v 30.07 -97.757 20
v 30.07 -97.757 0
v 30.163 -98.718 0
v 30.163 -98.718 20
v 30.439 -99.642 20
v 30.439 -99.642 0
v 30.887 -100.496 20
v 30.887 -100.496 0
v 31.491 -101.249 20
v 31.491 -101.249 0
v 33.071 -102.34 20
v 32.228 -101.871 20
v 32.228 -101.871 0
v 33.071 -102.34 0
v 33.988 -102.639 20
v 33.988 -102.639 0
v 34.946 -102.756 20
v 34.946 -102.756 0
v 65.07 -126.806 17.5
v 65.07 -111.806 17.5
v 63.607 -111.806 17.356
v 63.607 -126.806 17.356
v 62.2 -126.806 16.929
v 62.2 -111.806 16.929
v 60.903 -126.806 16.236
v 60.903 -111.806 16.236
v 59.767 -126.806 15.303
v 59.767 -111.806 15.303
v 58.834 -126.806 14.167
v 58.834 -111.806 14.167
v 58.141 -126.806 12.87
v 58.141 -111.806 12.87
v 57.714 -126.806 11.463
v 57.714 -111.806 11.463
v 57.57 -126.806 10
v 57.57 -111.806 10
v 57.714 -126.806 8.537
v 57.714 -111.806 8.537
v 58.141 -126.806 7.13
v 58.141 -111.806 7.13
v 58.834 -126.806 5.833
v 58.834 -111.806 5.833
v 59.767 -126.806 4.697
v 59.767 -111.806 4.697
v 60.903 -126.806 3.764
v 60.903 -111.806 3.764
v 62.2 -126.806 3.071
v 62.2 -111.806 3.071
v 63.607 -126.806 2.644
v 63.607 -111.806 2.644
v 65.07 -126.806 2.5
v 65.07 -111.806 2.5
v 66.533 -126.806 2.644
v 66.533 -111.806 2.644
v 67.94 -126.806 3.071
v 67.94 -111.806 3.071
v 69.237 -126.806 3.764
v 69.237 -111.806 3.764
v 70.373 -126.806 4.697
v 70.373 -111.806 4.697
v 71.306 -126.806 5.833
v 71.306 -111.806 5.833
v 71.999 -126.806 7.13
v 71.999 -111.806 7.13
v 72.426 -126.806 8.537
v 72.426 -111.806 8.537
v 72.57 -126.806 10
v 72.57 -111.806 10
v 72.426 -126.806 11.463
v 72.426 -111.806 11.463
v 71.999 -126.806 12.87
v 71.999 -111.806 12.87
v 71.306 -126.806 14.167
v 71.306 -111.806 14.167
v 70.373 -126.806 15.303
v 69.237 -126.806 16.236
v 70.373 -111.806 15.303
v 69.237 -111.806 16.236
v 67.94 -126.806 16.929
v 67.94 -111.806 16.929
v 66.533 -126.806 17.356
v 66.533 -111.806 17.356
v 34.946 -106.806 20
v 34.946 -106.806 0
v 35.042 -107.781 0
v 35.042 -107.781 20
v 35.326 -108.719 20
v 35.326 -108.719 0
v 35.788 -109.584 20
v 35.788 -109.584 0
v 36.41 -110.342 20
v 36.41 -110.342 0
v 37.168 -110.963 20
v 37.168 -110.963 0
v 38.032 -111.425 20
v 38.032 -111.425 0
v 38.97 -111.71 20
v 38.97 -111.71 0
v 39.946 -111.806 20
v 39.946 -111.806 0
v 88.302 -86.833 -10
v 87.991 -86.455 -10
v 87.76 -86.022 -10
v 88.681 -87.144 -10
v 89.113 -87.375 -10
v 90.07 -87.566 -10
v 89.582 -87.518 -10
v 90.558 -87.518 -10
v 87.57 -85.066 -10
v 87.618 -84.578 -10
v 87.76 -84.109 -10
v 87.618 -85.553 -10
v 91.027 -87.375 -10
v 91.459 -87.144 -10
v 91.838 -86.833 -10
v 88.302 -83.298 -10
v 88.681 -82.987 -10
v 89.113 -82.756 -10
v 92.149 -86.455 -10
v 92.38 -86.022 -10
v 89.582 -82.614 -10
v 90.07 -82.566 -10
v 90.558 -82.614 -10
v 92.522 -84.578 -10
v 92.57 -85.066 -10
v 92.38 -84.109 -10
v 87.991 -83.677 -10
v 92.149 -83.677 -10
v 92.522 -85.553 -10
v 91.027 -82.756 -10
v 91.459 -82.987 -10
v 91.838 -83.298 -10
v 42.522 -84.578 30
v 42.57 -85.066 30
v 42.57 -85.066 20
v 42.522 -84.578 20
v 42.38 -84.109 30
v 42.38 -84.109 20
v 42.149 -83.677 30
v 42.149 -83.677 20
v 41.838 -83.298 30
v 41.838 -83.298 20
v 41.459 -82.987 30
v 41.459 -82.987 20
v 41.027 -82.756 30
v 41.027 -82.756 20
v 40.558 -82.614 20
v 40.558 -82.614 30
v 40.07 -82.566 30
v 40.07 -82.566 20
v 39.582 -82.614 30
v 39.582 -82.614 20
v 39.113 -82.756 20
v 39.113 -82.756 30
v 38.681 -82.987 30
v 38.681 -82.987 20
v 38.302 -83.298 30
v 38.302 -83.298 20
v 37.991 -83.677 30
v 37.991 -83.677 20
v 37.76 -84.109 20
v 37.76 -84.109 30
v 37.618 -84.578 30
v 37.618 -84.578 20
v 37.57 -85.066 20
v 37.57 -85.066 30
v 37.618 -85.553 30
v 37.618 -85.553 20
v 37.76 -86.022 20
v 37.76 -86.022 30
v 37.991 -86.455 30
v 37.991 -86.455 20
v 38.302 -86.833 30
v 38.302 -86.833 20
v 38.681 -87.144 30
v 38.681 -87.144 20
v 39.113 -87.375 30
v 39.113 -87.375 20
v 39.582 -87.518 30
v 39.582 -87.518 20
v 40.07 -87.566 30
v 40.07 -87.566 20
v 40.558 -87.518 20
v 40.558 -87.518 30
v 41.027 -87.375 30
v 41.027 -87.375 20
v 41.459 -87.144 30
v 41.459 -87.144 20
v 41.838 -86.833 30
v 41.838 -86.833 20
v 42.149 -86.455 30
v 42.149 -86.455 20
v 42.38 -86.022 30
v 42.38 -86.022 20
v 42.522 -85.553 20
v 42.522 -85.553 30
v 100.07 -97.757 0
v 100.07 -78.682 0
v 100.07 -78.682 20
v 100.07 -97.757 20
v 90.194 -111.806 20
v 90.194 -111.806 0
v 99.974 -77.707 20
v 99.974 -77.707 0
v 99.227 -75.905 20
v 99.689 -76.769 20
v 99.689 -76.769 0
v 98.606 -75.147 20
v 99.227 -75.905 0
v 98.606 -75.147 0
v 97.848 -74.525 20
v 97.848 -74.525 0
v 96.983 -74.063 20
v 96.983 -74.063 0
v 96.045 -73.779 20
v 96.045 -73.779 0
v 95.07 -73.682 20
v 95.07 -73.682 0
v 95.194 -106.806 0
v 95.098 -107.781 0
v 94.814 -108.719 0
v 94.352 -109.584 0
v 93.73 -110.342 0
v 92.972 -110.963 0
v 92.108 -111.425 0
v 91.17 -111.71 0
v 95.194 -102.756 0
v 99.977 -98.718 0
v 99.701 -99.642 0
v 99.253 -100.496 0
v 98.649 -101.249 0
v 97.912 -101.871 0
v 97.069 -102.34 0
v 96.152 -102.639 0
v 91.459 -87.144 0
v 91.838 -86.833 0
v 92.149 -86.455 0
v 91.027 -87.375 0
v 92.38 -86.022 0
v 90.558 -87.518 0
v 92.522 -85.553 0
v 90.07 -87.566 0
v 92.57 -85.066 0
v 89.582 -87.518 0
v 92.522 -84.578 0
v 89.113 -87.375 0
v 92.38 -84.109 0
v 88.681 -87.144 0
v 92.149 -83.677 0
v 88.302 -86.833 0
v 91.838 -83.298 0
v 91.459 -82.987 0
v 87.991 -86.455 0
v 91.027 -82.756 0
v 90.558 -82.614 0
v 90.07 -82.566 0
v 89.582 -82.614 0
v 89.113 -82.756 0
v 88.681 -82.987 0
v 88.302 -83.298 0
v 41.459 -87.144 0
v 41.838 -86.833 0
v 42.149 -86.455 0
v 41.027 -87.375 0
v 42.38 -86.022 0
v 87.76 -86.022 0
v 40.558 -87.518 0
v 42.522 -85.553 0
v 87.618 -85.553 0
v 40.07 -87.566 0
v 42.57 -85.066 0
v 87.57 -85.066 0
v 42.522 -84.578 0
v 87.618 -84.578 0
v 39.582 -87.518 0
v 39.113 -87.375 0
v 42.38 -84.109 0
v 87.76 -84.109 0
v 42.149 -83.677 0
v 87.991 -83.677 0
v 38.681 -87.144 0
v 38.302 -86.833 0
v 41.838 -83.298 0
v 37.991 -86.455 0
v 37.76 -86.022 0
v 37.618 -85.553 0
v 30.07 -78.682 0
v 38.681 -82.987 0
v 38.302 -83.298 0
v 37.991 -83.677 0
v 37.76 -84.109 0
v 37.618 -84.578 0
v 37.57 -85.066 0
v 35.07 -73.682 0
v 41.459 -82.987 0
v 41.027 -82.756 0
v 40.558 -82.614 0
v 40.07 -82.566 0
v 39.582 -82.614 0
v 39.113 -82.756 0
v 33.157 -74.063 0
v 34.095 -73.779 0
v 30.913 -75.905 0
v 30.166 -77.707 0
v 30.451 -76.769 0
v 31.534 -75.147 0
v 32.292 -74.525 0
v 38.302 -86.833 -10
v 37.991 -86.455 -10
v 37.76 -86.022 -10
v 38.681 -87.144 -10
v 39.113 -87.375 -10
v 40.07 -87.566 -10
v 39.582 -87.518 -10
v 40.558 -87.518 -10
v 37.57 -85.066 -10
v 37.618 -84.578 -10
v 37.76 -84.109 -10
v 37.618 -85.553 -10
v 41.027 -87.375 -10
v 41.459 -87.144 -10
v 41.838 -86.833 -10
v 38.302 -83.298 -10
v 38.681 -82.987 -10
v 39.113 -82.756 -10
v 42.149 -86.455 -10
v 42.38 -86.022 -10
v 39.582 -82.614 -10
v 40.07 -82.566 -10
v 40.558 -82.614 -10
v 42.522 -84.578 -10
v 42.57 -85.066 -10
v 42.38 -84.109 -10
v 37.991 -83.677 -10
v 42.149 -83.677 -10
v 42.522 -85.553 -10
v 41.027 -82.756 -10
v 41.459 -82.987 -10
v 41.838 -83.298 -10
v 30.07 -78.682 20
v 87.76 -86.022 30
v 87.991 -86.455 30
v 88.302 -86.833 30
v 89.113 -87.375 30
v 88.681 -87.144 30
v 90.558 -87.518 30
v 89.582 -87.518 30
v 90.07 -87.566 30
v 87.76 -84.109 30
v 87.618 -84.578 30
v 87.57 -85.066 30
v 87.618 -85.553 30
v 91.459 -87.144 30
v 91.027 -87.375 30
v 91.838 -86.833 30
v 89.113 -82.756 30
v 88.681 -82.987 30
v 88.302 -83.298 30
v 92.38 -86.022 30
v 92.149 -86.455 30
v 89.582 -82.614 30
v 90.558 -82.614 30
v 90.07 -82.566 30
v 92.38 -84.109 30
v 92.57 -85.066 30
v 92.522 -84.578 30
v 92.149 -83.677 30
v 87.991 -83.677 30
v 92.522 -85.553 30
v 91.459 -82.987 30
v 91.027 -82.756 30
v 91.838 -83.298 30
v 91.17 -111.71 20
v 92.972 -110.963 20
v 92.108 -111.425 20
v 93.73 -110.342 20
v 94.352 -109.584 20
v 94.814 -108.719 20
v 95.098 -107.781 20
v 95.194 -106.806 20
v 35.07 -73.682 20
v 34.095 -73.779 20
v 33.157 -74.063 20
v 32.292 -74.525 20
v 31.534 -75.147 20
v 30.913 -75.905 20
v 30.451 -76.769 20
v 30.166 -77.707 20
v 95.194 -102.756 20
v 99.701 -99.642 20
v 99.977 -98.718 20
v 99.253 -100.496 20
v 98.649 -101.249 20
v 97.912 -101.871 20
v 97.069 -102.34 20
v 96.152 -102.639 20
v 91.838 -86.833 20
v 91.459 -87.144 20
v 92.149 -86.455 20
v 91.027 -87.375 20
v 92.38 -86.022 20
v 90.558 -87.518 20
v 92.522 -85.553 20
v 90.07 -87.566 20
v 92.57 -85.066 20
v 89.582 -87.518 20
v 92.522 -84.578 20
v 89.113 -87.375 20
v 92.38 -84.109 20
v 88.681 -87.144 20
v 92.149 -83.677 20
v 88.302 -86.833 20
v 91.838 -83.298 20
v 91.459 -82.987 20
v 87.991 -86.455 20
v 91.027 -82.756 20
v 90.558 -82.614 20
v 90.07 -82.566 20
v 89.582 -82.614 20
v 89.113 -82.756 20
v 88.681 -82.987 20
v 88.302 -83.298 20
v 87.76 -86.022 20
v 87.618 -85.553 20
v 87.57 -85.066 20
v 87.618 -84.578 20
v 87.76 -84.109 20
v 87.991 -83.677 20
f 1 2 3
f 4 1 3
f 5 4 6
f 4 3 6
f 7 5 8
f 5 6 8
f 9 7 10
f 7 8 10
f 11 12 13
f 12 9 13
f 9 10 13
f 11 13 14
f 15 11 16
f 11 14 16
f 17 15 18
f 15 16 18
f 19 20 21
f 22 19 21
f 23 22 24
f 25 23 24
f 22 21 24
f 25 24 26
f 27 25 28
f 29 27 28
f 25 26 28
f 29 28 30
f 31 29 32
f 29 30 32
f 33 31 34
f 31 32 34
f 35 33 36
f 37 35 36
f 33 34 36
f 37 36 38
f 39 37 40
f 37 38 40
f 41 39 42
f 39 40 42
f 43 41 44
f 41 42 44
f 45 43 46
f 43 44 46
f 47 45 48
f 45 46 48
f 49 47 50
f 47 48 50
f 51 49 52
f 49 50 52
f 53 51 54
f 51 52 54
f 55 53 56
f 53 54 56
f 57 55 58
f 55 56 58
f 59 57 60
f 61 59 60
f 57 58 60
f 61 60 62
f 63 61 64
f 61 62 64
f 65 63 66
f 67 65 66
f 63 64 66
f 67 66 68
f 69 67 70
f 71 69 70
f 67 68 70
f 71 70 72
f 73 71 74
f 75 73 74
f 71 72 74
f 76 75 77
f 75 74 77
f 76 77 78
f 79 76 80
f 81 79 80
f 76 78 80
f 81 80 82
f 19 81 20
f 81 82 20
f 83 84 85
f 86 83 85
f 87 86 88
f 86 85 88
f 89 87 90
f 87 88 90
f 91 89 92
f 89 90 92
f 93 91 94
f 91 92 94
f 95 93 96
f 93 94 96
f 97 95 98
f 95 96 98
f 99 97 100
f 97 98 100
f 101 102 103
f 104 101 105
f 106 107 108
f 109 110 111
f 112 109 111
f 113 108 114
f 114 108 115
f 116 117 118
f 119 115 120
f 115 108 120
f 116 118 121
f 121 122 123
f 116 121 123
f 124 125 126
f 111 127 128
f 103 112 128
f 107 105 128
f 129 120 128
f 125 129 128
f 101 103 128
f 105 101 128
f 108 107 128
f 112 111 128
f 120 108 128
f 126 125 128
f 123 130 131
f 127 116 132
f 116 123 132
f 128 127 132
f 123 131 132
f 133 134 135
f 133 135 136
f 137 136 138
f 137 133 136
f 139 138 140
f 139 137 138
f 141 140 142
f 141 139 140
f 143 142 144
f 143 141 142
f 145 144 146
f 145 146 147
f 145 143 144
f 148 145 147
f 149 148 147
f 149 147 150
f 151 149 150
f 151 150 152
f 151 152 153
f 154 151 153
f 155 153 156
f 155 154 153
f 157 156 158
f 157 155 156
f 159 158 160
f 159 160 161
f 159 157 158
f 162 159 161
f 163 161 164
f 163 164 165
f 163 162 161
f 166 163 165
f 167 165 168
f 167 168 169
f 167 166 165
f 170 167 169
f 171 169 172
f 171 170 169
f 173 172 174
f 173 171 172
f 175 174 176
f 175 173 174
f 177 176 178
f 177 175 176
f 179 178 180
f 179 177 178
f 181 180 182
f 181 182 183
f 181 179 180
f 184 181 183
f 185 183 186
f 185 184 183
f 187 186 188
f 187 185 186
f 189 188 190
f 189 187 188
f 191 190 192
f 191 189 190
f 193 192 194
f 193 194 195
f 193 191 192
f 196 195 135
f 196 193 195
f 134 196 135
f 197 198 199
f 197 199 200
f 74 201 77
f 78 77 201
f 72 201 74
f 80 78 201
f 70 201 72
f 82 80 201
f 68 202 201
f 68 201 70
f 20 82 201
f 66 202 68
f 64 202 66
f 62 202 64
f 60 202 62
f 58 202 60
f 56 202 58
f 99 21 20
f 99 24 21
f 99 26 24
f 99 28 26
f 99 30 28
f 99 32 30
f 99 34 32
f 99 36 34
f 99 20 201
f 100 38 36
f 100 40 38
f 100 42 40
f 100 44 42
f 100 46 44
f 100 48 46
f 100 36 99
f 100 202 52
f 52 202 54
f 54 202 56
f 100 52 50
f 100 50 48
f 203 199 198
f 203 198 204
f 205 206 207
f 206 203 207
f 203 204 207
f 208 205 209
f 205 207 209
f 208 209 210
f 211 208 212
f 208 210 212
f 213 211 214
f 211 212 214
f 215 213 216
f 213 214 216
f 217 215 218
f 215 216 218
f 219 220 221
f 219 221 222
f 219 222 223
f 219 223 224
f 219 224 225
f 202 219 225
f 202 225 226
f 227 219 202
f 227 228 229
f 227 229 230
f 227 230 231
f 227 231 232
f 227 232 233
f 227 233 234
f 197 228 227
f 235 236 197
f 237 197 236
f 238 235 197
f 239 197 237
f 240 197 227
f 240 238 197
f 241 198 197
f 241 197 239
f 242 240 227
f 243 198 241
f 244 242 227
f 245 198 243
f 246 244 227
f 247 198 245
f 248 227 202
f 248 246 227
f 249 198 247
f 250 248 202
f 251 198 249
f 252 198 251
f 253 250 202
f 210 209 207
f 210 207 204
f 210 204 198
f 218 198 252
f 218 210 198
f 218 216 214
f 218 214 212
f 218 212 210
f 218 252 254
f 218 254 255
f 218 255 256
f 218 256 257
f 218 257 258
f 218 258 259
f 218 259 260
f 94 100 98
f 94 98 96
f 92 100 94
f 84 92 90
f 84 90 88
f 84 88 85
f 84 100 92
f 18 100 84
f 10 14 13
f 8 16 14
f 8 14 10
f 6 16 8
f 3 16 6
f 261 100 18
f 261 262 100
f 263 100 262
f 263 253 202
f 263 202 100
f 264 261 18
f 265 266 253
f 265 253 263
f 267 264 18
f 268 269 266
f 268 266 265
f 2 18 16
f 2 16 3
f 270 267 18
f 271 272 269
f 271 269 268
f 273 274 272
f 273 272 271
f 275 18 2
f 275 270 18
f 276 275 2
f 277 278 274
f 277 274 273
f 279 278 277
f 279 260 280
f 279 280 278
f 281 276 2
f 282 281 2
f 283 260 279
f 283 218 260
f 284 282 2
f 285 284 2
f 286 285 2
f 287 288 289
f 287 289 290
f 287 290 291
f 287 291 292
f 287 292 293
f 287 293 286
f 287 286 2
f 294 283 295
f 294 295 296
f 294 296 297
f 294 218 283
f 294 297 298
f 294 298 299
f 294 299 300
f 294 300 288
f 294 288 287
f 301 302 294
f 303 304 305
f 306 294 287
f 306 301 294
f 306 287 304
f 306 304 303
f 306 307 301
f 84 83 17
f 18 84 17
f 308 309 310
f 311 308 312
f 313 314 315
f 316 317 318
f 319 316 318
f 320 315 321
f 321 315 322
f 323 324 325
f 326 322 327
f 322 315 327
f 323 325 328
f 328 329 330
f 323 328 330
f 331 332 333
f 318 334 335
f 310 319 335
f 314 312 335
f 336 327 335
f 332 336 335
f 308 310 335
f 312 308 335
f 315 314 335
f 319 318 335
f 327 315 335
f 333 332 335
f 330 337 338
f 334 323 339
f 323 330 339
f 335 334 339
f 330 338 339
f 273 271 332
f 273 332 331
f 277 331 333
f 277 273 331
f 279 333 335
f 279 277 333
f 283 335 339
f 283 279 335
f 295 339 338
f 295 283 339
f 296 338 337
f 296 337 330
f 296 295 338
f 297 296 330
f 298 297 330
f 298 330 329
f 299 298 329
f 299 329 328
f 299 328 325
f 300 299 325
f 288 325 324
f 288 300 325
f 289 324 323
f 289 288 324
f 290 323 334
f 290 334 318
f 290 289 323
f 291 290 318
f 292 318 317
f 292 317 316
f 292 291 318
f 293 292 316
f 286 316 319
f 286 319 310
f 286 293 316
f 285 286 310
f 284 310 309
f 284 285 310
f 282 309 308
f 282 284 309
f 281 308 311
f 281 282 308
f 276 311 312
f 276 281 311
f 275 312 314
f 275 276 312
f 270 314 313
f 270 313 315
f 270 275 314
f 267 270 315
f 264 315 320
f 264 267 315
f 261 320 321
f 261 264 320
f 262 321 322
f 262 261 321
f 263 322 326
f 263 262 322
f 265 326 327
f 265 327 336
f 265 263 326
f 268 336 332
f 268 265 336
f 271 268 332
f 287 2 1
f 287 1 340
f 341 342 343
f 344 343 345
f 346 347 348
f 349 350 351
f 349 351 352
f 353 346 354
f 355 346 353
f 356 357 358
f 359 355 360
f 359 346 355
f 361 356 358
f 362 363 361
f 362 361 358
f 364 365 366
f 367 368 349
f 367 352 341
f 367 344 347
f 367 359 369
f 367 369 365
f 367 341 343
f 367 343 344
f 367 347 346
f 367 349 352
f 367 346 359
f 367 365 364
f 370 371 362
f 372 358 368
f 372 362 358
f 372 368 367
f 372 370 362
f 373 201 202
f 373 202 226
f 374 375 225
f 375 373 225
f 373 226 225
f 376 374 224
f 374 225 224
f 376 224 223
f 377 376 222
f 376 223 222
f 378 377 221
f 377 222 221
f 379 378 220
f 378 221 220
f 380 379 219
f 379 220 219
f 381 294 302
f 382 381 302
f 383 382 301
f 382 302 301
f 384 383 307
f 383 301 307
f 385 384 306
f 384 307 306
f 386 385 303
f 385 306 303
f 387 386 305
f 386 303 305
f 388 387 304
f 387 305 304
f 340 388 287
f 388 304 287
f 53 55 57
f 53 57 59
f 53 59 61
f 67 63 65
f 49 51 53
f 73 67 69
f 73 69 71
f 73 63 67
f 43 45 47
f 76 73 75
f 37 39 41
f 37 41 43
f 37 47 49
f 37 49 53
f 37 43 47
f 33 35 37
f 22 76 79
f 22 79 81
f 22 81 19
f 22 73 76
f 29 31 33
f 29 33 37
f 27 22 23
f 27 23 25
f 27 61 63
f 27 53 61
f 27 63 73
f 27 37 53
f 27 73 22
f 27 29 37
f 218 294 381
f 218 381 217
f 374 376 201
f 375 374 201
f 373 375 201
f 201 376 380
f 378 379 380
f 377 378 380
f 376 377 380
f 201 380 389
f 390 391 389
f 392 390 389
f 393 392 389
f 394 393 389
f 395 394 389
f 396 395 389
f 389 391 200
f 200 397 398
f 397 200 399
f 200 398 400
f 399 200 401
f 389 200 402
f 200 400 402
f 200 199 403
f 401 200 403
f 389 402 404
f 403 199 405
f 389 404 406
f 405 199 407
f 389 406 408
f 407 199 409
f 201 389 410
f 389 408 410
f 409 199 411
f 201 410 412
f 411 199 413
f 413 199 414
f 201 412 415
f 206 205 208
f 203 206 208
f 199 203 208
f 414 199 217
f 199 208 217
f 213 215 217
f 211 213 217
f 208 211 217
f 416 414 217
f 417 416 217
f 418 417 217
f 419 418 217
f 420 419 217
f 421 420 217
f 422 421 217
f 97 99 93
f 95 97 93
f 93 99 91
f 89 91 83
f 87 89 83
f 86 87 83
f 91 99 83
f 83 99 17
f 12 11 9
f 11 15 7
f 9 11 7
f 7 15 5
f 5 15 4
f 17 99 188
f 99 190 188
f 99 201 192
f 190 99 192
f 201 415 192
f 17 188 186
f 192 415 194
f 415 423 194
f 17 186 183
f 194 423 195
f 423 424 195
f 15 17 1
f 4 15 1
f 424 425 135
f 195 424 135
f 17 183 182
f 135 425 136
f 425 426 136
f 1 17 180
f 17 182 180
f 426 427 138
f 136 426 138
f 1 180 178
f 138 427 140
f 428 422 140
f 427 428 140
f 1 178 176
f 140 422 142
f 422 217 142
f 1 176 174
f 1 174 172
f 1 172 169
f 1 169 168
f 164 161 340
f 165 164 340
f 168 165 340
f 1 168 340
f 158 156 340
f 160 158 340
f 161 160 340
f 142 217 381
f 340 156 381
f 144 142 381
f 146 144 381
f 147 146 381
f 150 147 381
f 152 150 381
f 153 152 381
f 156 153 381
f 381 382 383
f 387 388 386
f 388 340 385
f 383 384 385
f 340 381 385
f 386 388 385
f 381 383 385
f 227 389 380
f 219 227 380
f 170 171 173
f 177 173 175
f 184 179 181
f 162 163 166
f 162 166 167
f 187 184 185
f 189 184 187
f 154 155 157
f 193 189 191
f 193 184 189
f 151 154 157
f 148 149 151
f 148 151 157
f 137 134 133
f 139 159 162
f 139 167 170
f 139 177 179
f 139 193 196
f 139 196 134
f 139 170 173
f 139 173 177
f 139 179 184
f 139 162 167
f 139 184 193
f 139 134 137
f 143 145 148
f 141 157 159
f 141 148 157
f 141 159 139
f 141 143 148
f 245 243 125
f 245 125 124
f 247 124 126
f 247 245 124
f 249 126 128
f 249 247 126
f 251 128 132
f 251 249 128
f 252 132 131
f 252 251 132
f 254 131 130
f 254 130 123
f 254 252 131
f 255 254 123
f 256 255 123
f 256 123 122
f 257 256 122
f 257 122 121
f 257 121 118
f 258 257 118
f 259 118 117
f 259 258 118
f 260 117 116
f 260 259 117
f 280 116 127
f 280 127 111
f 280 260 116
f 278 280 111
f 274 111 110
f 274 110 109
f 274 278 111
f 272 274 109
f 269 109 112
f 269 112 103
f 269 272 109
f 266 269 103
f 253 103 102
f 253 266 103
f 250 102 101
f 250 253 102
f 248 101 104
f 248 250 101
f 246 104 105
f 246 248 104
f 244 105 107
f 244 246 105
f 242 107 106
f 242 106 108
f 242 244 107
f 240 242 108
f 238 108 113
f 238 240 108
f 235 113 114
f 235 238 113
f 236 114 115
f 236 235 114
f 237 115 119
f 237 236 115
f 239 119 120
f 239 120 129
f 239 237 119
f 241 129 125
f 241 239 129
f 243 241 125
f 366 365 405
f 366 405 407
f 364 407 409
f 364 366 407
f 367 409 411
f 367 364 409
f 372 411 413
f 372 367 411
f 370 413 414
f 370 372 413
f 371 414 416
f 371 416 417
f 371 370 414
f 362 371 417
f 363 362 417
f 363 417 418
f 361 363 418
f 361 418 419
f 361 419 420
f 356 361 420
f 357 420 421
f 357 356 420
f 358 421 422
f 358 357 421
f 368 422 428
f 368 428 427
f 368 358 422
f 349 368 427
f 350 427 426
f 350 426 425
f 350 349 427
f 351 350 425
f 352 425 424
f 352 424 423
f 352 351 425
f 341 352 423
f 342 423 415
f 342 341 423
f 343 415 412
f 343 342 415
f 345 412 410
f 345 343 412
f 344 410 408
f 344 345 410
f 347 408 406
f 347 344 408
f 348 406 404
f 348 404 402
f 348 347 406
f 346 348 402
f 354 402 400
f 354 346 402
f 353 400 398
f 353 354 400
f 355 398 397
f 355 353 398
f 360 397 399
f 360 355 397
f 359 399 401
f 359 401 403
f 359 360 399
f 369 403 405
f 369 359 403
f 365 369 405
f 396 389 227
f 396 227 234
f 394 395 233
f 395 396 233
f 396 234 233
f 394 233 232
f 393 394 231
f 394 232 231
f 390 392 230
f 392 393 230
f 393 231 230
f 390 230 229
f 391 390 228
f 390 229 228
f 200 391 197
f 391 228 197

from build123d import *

# Parameters (mm, degrees)
SKETCH1_R             = 2.5
BOSS_EXTRUDE1_DEPTH   = 10
BOSS_EXTRUDE1_2_DEPTH = 10
BOSS_EXTRUDE2_DEPTH   = 20
FILLET1_R             = 5
SKETCH4_R             = 7.5
BOSS_EXTRUDE3_DEPTH   = 15
BOSS_EXTRUDE4_START   = 10
SKETCH5_R             = 2.5
BOSS_EXTRUDE4_DEPTH   = 10


with BuildPart() as part:
    # Sketch1 → Boss-Extrude1 (new body)
    with BuildSketch(Plane.XY):
        with Locations((90.07, -85.065581077)):
            Circle(SKETCH1_R)
    extrude(amount=-BOSS_EXTRUDE1_DEPTH)



with BuildPart() as body_2:
    # Sketch1 → Boss-Extrude1 2 (new body)
    with BuildSketch(Plane.XY):
        with Locations((40.07, -85.065581077)):
            Circle(SKETCH1_R)
    extrude(amount=-BOSS_EXTRUDE1_2_DEPTH)


with BuildPart() as part_1:
    add(part.part)

    add(body_2.part)  # Boss-Extrude2 merges body 2
    # Sketch2 → Boss-Extrude2 (add)
    with BuildSketch(Plane.XY):
        Polygon((30.07, -73.682440954), (100.07, -73.682440954), (100.07, -102.755947539), (95.194338838, -102.755947539), (95.194338838, -111.806017714), (34.945661162, -111.806017714), (34.945661162, -102.755947539), (30.07, -102.755947539), align=None)
    extrude(amount=BOSS_EXTRUDE2_DEPTH)

    # Fillet1
    # the kernel refuses this fillet: 5 mm, written as the material it takes off along each edge
    with BuildSketch(Plane(origin=(100.07, -73.682440954, -12.5), x_dir=(-1, 0, 0), z_dir=(0, 0, 1)), Plane(origin=(95.194338838, -111.806017714, -12.5), x_dir=(0, 1, 0), z_dir=(0, 0, 1))) as fillet1_piece_1:
        with BuildLine():
            CenterArc((FILLET1_R, FILLET1_R), FILLET1_R, 180, 90)
            Line((0, FILLET1_R), (-FILLET1_R * 0.02, FILLET1_R))
            Line((-FILLET1_R * 0.02, FILLET1_R), (-FILLET1_R * 0.02, -FILLET1_R * 0.02))
            Line((-FILLET1_R * 0.02, -FILLET1_R * 0.02), (FILLET1_R, -FILLET1_R * 0.02))
            Line((FILLET1_R, -FILLET1_R * 0.02), (FILLET1_R, 0))
        make_face()
    extrude(amount=45, mode=Mode.SUBTRACT)
    with BuildSketch(Plane(origin=(100.07, -102.755947539, -12.496134366), x_dir=(0, 1, 0), z_dir=(0, 0, 1))) as fillet1_piece_2:
        with BuildLine():
            CenterArc((4.998453746, 5), FILLET1_R, 181.424965019, 88.575034981)
            Line((0, 4.875661162), (-0.099969075, 4.873174386))
            ThreePointArc((-0.099969075, 4.873174386), (-0.1, 2.437830581), (-0.1, 0))
            Line((-0.1, 0), (0, -0.1))
            Line((0, -0.1), (4.998453746, -0.1))
            Line((4.998453746, -0.1), (4.998453746, 0))
        make_face()
    extrude(amount=44.992268731, mode=Mode.SUBTRACT)
    with BuildSketch(Plane(origin=(34.945661162, -111.806017714, -12.5), x_dir=(0, 1, 0), z_dir=(0, 0, 1)), Plane(origin=(30.07, -73.682440954, -12.5), x_dir=(1, 0, 0), z_dir=(0, 0, 1))) as fillet1_piece_3:
        with BuildLine():
            CenterArc((FILLET1_R, -FILLET1_R), FILLET1_R, 90, 90)
            Line((0, -FILLET1_R), (-FILLET1_R * 0.02, -FILLET1_R))
            Line((-FILLET1_R * 0.02, -FILLET1_R), (-FILLET1_R * 0.02, FILLET1_R * 0.02))
            Line((-FILLET1_R * 0.02, FILLET1_R * 0.02), (FILLET1_R, FILLET1_R * 0.02))
            Line((FILLET1_R, FILLET1_R * 0.02), (FILLET1_R, 0))
        make_face()
    extrude(amount=45, mode=Mode.SUBTRACT)
    with BuildSketch(Plane(origin=(30.07, -102.755947539, -12.496134366), x_dir=(0, 1, 0), z_dir=(0, 0, 1))) as fillet1_piece_4:
        with BuildLine():
            CenterArc((4.998453746, -5), FILLET1_R, 90, 88.575034981)
            Line((0, -4.875661162), (-0.099969075, -4.873174386))
            ThreePointArc((-0.099969075, -4.873174386), (-0.1, -2.437830581), (-0.1, 0))
            Line((-0.1, 0), (0, 0.1))
            Line((0, 0.1), (4.998453746, 0.1))
            Line((4.998453746, 0.1), (4.998453746, 0))
        make_face()
    extrude(amount=44.992268731, mode=Mode.SUBTRACT)

    # Sketch4 → Boss-Extrude3 (add)
    with BuildSketch(Plane.XZ.offset(111.806017714)):
        with Locations(Location((65.07, 10, 0), (0, 0, 90))):
            Circle(SKETCH4_R)
    extrude(amount=BOSS_EXTRUDE3_DEPTH)

    # Sketch5 → Boss-Extrude4 (add)
    with BuildSketch(Plane.XY.offset(20).offset(BOSS_EXTRUDE4_START)):
        with Locations((90.07, -85.065581077)):
            Circle(SKETCH5_R)
        with Locations((40.07, -85.065581077)):
            Circle(SKETCH5_R)
    extrude(amount=-BOSS_EXTRUDE4_DEPTH)


solid = part_1.part
